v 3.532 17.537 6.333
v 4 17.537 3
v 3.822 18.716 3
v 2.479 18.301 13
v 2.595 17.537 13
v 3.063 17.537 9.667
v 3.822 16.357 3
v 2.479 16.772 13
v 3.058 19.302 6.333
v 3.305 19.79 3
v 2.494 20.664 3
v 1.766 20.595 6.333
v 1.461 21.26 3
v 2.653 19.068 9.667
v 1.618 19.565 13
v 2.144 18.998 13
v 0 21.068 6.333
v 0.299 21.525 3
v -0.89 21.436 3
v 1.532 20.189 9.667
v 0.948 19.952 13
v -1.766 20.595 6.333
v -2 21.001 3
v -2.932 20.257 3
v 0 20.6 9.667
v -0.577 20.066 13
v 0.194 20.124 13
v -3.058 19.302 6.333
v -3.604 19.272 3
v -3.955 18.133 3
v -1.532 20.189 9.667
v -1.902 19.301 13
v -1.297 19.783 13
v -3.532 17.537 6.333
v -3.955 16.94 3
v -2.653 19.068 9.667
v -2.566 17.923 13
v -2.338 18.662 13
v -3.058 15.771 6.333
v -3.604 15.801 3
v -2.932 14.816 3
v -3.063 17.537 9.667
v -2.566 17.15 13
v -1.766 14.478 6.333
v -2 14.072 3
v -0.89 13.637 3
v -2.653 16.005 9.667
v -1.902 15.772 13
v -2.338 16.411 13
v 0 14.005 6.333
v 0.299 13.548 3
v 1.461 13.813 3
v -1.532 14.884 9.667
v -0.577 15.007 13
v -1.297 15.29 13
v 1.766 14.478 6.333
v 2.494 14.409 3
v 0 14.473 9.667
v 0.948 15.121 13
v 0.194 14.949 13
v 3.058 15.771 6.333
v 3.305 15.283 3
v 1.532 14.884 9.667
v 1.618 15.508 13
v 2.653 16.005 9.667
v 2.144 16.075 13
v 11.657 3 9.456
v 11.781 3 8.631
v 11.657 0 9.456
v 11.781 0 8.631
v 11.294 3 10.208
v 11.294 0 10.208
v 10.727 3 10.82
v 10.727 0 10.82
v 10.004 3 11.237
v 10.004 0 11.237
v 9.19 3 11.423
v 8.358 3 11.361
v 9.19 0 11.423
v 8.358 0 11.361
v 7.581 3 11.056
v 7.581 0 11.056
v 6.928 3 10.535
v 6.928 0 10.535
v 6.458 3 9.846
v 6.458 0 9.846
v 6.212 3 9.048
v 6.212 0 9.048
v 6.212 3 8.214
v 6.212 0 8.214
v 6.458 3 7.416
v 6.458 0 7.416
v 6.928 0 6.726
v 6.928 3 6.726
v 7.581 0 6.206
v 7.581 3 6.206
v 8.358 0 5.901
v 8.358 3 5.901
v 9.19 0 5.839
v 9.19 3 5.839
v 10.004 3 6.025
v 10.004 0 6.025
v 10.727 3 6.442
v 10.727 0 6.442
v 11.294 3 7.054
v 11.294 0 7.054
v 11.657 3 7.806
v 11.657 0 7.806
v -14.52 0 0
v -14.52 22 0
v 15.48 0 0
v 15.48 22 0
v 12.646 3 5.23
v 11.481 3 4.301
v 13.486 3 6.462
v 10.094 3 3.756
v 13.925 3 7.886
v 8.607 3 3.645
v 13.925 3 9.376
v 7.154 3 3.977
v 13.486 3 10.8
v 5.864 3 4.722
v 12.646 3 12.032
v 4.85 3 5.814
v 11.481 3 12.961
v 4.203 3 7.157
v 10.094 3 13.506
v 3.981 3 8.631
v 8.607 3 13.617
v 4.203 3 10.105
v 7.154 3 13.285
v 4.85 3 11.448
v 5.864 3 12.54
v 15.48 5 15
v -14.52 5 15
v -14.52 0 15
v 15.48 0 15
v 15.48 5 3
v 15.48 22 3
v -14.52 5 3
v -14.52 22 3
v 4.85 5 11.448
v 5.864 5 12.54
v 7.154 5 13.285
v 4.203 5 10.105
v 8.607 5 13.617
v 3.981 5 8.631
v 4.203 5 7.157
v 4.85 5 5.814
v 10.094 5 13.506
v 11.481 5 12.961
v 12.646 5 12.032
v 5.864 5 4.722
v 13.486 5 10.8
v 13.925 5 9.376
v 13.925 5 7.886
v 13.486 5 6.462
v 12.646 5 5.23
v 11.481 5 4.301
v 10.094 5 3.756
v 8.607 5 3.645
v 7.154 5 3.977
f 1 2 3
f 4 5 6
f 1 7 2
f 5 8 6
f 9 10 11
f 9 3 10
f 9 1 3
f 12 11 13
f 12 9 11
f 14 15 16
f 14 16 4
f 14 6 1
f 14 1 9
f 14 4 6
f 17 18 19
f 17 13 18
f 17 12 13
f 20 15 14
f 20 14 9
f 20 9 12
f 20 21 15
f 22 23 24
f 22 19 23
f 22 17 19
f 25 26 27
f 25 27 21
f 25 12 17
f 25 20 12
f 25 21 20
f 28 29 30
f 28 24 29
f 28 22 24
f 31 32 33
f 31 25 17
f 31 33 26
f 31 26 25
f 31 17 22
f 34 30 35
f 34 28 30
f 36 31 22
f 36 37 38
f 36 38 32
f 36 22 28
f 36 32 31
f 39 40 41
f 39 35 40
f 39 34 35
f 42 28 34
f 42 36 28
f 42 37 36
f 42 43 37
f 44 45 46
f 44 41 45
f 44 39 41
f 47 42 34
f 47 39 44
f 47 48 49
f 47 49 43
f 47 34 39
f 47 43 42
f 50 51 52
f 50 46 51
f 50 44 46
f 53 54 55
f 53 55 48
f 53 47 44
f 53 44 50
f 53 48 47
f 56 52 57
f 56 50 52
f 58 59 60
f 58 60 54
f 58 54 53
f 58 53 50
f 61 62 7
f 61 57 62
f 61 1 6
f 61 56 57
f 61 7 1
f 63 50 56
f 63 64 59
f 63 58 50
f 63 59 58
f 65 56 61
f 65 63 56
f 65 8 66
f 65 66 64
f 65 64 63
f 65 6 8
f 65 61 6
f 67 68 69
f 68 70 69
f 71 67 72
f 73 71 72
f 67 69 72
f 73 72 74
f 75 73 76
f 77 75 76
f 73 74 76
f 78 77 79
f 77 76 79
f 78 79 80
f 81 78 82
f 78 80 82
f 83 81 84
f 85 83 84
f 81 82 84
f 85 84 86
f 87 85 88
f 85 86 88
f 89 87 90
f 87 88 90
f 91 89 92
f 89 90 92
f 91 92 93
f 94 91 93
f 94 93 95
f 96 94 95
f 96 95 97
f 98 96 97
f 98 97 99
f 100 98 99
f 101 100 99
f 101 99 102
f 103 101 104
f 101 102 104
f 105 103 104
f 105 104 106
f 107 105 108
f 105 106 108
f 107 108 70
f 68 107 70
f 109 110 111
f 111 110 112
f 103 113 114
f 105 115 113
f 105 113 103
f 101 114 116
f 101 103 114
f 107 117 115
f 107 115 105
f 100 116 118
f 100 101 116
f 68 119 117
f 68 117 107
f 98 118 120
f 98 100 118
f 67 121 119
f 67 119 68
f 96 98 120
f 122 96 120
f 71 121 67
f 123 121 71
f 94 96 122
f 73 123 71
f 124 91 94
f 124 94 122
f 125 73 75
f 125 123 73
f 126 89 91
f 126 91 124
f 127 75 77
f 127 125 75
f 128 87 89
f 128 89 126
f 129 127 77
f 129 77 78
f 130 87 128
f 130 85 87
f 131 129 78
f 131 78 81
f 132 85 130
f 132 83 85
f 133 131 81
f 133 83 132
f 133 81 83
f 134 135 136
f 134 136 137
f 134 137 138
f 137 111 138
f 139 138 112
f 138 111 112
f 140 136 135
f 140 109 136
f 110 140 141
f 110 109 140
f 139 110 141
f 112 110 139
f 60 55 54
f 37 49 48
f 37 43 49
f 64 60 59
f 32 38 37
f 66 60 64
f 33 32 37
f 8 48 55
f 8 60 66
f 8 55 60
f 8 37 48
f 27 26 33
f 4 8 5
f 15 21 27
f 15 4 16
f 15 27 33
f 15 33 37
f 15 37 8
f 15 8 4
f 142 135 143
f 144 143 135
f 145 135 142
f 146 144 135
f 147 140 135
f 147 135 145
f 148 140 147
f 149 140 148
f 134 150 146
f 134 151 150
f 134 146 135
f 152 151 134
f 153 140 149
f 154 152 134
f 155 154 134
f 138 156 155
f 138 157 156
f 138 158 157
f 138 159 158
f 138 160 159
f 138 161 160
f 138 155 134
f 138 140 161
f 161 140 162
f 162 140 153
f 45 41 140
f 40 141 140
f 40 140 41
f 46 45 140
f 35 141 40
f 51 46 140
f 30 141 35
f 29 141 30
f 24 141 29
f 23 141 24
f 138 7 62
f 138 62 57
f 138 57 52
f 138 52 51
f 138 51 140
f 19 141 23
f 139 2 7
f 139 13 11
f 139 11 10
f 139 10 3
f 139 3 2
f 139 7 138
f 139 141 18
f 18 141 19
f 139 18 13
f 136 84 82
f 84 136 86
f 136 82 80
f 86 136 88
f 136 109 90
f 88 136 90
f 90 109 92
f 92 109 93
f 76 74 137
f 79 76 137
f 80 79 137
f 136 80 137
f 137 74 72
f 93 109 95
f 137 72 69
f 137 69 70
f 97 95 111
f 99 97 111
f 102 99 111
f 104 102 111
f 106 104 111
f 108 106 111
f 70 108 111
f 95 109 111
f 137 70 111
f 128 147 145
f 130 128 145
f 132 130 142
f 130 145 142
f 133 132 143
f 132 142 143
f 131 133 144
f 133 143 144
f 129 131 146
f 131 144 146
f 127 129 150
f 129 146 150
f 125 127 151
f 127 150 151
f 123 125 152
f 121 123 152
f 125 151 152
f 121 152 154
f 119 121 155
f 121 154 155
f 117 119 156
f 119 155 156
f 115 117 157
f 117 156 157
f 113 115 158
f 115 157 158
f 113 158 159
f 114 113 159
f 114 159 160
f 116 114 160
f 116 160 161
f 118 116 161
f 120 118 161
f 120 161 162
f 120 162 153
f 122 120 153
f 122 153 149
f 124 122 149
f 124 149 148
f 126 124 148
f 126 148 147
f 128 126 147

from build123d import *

# Parameters (mm, degrees)
F0_W           = 30
F0_H           = 22
F1_DEPTH       = 3
F2_W           = 30
F2_H           = 5
F2_R           = 4
F3_DEPTH       = 10
F3_TAPER       = 8
F4_DEPTH       = 12
F6_D           = 5.6
F6_DEPTH       = 15
F6_CBORE_D     = 10
F6_CBORE_DEPTH = 2
F6_TIP         = 1.6824097333


with BuildPart() as f1:
    # F0 (on Top) → F1 (new body)
    with BuildSketch(Plane.XY):
        with Locations((0.4801530018, 11)):
            Rectangle(F0_W, F0_H)
    extrude(amount=F1_DEPTH)

    # F2 (on face) → F3 (join)
    with BuildSketch(Plane.XY.offset(3)):
        with Locations((0.4801530018, 2.5)):
            Rectangle(F2_W, F2_H)
        with Locations((0, 17.5365079194)):
            Circle(F2_R)
    extrude(amount=F3_DEPTH, taper=F3_TAPER)

    # F2 (on face) → F4 (join)
    with BuildSketch(Plane.XY.offset(3)):
        with Locations((0.4801530018, 2.5)):
            Rectangle(F2_W, F2_H)
    extrude(amount=F4_DEPTH)

    # F6
    with Locations(Plane(origin=(0, 5, 0), x_dir=(-1, 0, 0), z_dir=(0, 1, 0))):
        with Locations((-8.9809922501, 8.6309639737)):
            CounterBoreHole(F6_D / 2, F6_CBORE_D / 2, F6_CBORE_DEPTH, depth=F6_DEPTH)
            with Locations((0, 0, -(F6_DEPTH + F6_TIP / 2))):  # 118° drill point
                Cone(0, F6_D / 2, F6_TIP, mode=Mode.SUBTRACT)


solid = f1.part
